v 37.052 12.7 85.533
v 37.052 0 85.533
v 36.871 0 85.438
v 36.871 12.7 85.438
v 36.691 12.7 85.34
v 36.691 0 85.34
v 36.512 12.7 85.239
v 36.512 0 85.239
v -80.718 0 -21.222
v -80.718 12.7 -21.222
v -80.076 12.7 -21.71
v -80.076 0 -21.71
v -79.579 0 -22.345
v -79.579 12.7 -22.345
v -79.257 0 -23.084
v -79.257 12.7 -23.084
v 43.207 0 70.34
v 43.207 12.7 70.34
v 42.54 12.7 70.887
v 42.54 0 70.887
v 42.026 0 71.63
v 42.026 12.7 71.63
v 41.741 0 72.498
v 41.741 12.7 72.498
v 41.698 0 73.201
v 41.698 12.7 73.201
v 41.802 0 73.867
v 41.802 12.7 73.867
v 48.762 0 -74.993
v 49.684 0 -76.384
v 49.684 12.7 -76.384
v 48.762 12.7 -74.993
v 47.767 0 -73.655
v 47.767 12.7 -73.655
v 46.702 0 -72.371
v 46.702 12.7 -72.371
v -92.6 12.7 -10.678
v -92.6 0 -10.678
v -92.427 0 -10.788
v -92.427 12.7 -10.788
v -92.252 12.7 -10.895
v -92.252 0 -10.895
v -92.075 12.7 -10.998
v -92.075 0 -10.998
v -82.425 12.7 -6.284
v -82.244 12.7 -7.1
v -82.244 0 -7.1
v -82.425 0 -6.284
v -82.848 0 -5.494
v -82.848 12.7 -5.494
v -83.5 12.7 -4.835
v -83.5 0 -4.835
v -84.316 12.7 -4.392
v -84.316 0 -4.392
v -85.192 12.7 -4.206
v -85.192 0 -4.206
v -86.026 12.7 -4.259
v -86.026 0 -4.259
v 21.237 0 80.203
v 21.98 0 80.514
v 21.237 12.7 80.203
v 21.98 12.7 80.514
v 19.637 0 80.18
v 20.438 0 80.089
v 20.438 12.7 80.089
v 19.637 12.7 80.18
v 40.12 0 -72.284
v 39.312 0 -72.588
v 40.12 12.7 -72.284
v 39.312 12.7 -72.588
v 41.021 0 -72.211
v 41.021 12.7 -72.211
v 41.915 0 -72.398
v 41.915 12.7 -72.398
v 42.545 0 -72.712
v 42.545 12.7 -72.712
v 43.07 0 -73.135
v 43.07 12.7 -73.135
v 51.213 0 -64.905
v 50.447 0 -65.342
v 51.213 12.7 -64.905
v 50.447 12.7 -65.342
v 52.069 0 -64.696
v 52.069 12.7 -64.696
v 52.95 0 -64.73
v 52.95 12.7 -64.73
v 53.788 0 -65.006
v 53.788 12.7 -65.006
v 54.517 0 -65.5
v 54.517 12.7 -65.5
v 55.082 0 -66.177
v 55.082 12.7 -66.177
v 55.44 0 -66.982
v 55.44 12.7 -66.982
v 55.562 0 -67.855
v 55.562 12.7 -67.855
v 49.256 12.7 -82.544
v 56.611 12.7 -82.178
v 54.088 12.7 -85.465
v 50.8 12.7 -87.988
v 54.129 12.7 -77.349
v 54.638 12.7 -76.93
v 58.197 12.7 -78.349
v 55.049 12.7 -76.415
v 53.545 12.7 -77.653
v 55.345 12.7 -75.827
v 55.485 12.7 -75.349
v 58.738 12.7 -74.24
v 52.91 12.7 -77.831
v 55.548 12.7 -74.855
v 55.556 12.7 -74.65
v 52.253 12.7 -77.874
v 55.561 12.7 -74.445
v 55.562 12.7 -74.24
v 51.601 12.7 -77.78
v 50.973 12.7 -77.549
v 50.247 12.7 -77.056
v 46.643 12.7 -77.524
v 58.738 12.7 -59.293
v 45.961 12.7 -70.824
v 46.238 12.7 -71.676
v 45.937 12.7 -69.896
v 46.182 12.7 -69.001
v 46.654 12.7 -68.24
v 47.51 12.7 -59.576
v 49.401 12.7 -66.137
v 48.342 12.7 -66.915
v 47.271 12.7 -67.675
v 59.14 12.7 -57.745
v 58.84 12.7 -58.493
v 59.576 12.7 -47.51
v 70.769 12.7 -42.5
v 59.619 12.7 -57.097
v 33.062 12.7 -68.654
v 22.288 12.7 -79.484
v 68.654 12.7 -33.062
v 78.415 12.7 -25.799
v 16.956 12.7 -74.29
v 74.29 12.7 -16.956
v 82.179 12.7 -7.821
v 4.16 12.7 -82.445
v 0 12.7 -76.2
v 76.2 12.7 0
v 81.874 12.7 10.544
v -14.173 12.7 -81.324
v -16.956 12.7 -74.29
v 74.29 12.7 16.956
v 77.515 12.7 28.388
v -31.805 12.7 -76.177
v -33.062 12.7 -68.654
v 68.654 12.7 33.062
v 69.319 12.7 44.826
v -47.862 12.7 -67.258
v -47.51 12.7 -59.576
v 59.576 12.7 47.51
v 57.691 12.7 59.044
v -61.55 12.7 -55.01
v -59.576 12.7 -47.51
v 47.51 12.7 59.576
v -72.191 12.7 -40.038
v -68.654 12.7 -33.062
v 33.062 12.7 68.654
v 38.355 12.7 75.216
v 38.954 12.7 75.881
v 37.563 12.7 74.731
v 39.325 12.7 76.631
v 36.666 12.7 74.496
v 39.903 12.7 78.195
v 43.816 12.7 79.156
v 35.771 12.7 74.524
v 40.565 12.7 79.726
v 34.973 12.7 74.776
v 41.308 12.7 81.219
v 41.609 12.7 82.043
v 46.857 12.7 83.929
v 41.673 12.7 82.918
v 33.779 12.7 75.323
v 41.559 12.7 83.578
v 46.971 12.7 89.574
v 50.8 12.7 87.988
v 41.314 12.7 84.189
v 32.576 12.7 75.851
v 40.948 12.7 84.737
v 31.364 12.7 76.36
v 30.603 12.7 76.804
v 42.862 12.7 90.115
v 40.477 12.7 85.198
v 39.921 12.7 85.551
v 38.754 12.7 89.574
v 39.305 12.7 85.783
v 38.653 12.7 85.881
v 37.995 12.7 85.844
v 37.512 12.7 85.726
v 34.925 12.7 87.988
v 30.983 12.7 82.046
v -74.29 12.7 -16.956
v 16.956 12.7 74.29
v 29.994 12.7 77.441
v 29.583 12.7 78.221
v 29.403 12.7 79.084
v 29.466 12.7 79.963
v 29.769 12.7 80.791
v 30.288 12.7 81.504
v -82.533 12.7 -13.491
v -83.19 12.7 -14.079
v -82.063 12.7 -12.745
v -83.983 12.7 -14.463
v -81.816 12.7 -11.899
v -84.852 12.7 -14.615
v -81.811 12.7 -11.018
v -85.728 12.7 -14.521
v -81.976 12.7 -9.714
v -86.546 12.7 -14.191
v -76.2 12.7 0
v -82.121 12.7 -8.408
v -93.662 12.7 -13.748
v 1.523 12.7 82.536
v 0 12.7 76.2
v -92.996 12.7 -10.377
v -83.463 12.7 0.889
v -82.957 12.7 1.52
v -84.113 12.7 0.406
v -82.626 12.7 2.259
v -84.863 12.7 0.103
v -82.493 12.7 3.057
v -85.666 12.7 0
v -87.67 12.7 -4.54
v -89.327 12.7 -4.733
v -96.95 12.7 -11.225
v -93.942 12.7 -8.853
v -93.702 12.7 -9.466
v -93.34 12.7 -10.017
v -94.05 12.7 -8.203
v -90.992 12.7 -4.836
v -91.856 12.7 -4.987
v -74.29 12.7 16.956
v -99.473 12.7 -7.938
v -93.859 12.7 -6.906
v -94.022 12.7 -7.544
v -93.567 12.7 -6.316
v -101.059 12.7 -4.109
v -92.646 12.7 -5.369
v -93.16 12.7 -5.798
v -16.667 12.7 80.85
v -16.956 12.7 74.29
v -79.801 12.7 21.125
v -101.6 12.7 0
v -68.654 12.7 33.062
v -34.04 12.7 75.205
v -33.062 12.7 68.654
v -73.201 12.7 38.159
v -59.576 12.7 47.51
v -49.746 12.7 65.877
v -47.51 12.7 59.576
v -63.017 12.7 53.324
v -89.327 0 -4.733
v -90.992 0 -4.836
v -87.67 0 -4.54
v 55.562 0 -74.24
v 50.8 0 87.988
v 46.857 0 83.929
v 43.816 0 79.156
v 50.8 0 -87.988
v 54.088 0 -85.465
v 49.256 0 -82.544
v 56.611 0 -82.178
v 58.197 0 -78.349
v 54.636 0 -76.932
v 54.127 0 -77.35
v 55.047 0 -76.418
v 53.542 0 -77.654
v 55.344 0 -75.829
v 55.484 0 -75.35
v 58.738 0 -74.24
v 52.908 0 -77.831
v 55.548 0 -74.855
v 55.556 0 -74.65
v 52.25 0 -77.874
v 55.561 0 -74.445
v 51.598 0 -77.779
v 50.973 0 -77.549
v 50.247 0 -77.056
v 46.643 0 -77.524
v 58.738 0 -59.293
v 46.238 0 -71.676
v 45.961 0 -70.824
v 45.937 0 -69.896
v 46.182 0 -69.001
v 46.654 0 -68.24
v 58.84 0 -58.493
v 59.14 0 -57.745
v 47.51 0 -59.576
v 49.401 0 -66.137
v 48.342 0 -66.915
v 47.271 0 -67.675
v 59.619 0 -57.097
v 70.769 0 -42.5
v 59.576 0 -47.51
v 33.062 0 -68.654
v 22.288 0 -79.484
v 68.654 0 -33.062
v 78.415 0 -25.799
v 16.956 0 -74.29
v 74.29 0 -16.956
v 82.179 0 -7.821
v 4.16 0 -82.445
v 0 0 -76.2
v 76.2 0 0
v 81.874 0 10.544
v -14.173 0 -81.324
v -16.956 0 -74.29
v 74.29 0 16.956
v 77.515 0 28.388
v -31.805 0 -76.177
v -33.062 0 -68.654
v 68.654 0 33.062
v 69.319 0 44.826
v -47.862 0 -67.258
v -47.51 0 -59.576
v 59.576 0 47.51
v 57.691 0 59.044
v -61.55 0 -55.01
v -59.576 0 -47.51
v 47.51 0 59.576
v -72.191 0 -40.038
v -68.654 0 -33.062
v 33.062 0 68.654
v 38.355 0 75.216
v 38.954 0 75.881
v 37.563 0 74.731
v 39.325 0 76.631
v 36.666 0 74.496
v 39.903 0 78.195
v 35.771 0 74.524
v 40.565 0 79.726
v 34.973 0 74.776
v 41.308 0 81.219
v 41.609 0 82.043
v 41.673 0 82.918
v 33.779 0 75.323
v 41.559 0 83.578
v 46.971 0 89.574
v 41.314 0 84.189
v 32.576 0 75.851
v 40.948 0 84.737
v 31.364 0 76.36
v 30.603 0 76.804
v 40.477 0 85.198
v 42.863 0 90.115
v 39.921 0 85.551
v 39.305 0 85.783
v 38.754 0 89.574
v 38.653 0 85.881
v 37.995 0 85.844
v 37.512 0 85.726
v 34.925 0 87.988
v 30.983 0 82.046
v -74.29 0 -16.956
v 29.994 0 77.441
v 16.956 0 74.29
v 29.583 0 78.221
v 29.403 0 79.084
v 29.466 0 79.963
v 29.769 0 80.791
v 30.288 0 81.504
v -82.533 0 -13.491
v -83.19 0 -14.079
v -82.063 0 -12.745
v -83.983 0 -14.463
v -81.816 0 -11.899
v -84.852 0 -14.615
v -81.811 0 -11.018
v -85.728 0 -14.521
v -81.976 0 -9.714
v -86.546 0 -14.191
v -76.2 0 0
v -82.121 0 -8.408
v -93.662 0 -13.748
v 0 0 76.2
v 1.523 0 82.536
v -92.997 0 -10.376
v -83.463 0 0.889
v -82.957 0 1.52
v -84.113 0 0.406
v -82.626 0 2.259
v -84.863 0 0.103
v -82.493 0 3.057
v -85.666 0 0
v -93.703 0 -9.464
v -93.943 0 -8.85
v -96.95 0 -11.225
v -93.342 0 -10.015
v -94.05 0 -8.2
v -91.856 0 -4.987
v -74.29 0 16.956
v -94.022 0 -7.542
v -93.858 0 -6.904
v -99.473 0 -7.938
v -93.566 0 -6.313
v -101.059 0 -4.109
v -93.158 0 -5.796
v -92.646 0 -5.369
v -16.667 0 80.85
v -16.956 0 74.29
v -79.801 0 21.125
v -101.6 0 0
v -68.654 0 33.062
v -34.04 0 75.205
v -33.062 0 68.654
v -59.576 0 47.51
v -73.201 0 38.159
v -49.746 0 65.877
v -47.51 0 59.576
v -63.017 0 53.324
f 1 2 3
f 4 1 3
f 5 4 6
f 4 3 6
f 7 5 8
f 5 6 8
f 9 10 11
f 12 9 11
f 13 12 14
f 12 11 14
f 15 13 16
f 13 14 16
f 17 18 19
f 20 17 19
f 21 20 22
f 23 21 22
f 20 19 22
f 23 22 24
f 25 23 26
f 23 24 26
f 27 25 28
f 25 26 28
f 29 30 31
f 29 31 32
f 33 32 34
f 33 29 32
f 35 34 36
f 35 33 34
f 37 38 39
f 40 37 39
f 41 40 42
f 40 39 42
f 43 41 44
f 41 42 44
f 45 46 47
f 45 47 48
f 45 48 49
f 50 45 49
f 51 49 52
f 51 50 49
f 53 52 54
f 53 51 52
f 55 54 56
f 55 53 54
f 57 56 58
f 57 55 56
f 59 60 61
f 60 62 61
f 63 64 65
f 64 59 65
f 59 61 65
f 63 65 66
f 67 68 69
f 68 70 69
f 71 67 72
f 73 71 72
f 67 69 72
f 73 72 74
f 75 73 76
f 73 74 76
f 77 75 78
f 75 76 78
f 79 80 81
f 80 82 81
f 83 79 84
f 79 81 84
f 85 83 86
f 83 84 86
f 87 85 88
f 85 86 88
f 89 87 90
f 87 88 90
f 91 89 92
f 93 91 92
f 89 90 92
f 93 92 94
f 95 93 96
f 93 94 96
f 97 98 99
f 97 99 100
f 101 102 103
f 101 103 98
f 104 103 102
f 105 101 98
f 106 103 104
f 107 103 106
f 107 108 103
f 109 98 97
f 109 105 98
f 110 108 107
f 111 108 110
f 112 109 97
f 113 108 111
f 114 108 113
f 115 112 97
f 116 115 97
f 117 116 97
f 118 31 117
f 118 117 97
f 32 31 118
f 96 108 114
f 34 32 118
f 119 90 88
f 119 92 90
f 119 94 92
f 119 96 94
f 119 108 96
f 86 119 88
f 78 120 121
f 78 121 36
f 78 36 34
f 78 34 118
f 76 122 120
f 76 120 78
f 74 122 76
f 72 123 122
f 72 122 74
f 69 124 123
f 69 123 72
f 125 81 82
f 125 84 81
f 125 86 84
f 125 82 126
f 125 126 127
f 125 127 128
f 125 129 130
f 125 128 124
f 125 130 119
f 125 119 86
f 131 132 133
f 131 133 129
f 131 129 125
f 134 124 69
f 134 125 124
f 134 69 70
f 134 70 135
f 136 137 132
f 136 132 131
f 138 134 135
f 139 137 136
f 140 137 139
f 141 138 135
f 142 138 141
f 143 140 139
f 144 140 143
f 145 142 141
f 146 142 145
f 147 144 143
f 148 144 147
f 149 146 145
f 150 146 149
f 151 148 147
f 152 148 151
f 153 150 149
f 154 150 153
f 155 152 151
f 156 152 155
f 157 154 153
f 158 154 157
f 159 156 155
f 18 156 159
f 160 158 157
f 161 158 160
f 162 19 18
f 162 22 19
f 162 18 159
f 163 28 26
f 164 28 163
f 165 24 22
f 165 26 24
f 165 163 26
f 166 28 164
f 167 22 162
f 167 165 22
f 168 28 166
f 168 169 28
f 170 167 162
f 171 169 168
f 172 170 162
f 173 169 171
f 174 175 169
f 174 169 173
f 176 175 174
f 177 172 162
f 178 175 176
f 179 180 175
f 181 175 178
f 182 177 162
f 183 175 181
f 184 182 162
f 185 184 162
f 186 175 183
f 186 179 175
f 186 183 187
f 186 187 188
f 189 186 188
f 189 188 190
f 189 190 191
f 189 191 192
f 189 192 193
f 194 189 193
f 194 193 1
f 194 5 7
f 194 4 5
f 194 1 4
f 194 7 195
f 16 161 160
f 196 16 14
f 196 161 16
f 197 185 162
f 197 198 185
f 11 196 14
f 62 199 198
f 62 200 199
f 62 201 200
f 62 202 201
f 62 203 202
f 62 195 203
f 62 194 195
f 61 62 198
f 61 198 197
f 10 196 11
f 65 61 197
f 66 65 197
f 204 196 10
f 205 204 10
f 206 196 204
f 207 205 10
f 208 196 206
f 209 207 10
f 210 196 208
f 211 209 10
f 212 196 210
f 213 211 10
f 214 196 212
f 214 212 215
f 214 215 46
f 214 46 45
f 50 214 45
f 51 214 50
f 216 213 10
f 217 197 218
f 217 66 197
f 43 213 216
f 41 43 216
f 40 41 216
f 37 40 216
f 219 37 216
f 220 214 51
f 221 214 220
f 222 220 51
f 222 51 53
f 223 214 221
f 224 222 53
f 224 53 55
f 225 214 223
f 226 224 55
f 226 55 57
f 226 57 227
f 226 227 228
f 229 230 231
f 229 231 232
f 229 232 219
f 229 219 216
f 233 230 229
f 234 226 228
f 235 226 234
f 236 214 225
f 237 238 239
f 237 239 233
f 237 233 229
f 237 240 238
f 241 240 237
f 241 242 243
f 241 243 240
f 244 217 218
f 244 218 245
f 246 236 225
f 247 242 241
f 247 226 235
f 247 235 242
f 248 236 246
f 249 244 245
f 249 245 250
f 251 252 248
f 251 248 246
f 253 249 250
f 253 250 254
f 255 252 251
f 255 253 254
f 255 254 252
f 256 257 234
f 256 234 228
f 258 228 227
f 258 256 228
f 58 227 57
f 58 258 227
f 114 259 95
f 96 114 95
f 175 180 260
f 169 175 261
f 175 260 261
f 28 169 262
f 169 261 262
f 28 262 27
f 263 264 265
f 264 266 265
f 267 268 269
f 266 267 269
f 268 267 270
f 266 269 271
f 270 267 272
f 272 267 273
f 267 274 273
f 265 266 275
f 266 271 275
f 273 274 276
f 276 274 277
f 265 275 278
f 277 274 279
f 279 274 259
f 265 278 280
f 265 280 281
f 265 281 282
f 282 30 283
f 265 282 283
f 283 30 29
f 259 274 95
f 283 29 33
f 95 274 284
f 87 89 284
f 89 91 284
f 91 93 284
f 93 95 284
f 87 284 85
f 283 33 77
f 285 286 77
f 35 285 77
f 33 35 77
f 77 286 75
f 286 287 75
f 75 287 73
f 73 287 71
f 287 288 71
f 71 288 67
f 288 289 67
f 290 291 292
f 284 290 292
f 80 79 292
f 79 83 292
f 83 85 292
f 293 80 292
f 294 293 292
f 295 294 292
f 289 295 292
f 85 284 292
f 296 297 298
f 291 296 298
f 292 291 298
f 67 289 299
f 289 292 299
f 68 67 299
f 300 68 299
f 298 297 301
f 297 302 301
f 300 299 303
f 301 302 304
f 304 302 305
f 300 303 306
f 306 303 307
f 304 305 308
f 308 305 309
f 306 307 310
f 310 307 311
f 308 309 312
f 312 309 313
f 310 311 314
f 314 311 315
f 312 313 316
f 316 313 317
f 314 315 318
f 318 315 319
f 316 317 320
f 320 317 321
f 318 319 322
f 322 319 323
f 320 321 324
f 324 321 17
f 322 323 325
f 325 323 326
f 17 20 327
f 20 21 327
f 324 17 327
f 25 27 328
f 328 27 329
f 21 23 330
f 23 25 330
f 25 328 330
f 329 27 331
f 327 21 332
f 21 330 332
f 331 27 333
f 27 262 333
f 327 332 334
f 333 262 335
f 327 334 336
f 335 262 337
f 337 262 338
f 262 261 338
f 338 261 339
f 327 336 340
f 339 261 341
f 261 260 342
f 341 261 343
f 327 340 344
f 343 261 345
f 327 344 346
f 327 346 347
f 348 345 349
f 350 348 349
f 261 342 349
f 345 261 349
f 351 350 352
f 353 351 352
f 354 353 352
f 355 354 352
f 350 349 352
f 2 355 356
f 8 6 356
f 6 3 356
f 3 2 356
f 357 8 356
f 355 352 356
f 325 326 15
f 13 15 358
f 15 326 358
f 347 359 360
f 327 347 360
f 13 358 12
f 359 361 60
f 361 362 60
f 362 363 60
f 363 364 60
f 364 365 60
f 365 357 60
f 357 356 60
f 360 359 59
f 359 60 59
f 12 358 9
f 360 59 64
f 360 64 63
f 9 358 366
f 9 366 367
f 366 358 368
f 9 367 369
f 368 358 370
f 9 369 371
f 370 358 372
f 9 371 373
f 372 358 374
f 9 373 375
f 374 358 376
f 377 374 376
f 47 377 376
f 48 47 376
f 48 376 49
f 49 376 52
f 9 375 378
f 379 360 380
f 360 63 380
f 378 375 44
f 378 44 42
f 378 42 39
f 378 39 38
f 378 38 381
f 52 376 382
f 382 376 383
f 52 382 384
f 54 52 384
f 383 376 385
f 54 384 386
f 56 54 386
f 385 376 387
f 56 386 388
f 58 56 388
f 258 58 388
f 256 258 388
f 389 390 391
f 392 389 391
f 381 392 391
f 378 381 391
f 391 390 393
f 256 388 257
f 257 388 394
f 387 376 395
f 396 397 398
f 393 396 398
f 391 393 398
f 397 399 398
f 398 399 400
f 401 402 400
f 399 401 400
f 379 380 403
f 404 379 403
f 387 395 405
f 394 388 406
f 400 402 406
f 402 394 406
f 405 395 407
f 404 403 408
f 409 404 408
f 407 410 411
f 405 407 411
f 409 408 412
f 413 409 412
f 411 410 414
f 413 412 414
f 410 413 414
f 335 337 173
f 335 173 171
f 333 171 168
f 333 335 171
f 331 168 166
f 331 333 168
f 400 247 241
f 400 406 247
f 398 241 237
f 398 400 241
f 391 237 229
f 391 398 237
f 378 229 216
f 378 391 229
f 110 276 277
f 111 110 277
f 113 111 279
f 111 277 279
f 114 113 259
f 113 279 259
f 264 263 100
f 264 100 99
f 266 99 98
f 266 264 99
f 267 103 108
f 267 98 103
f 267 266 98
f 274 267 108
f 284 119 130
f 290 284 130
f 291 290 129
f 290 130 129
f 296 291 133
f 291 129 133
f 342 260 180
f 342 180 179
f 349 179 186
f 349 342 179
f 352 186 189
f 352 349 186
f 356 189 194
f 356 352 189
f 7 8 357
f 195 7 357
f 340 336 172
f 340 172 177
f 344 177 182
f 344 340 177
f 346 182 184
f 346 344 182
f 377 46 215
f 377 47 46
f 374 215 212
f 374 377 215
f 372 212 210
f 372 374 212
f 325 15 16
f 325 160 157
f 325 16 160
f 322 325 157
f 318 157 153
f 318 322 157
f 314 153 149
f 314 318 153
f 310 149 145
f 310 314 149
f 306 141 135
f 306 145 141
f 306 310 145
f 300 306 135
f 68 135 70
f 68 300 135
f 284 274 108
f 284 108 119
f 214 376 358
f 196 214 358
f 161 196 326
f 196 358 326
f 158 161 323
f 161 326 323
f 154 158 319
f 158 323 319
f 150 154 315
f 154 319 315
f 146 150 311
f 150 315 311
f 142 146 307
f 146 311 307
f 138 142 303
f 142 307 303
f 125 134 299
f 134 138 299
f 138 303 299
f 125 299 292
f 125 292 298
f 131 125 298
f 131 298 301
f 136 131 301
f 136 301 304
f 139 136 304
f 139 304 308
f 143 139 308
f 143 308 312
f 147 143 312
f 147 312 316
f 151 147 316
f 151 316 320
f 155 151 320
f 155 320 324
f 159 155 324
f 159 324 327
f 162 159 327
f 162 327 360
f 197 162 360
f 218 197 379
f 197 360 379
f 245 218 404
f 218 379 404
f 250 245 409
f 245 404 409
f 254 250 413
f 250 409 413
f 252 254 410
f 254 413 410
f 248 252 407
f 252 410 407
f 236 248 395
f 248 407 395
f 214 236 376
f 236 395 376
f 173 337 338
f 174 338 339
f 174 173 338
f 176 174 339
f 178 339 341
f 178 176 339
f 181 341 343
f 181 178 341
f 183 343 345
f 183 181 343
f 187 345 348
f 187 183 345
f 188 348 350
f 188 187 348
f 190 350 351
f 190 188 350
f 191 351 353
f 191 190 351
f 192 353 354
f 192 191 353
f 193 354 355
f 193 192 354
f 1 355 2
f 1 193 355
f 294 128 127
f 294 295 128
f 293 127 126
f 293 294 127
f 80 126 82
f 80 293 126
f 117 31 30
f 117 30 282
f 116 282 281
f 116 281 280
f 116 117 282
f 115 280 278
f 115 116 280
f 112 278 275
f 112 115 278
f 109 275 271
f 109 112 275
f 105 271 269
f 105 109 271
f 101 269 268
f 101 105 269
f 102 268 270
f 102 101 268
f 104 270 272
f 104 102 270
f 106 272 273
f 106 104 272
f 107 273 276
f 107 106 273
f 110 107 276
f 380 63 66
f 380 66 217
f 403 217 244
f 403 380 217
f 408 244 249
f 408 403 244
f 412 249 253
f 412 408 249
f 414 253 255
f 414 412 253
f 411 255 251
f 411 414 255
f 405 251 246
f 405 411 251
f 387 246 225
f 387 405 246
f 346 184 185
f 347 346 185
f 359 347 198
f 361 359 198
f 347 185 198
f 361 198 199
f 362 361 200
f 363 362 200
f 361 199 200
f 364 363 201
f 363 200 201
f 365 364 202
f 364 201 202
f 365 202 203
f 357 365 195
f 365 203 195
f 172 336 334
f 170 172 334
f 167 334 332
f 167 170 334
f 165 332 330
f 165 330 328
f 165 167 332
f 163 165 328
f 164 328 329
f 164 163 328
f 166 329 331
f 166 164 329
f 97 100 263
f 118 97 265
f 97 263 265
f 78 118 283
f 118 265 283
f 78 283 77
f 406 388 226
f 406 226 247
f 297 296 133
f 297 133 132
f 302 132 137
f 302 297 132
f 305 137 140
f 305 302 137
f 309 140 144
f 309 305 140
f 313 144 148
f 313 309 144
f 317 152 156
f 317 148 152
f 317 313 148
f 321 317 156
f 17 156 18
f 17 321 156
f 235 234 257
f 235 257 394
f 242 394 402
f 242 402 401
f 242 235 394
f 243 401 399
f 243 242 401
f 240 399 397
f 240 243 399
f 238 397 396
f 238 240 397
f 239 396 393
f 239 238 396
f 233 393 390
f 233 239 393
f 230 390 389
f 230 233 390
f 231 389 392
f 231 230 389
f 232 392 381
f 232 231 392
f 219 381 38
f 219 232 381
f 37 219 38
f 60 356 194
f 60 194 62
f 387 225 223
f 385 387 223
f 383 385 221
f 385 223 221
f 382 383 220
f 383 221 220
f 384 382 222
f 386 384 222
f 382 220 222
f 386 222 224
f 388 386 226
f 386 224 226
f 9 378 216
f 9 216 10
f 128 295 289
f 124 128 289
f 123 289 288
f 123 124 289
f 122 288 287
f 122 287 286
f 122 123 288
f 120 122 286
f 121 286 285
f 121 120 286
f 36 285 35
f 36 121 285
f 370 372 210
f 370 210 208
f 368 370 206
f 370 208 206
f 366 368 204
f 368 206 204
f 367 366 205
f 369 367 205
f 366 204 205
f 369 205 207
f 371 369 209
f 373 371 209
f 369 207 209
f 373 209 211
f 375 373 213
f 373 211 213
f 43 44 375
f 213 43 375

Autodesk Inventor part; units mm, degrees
ref_plane "YZ Plane" through (0, 0, 0) normal (1, 0, 0) x (0, 1, 0)
ref_plane "XZ Plane" through (0, 0, 0) normal (0, 1, 0) x (-1, 0, 0)
ref_plane "XY Plane" through (0, 0, 0) normal (0, 0, 1) x (1, 0, 0)
sketch "Sketch1" plane through (0, 0, 0) normal (0, 1, 0) x (-1, 0, 0)
  circle A0 centre (0, 0) radius 76.2
  circle A1 centre (0, 0) radius 82.55
  line L0 (0, 0) -> (101.6, 0)
  arc A2 (82.55, 0) -> (101.6, 0) centre (92.075, 26.1697) ccw
  line L1 (101.6, 0) -> (92.4836, -3.3181) construction
  arc A3 (93.6625, -13.7482) -> (101.6, 0) centre (85.725, 0) ccw
  line L2 (93.6625, -13.7482) -> (79.6013, -21.8664)
  arc A4 (92.075, -10.9985) -> (98.3891, -0.9543) centre (85.725, 0) ccw
  line L3 (92.075, -10.9985) -> (80.6536, -17.5927)
  arc A5 (82.4826, -3.3343) -> (101.2144, -3.4778) centre (92.075, 26.1697) ccw
  arc A6 (-41.275, 71.4904) -> (-50.8, 87.9882) centre (-68.7011, 66.6544) ccw
  line L4 (-50.8, 87.9882) -> (-43.3683, 81.7522) construction
  arc A7 (-34.925, 87.9882) -> (-50.8, 87.9882) centre (-42.8625, 74.24) ccw
  line L5 (-34.925, 87.9882) -> (-20.8638, 79.8699)
  arc A8 (-36.5125, 85.2386) -> (-48.3681, 85.6846) centre (-42.8625, 74.24) ccw
  line L6 (-36.5125, 85.2386) -> (-25.0911, 78.6444)
  arc A9 (-38.3537, 73.0992) -> (-47.5953, 89.3931) centre (-68.7011, 66.6544) ccw
  arc A10 (-41.275, -71.4904) -> (-50.8, -87.9882) centre (-23.3739, -92.8242) ccw
  line L7 (-50.8, -87.9882) -> (-49.1154, -78.4341) construction
  arc A11 (-58.7375, -74.24) -> (-50.8, -87.9882) centre (-42.8625, -74.24) ccw
  line L8 (-58.7375, -74.24) -> (-58.7375, -58.0035)
  arc A12 (-55.5625, -74.24) -> (-50.021, -84.7303) centre (-42.8625, -74.24) ccw
  line L9 (-55.5625, -74.24) -> (-55.5625, -61.0517)
  arc A13 (-44.1289, -69.7649) -> (-53.619, -85.9153) centre (-23.3739, -92.8242) ccw
  point P0 (-20.8638, 79.8699)
  point P1 (-41.275, 71.4904)
  point P2 (-58.7375, -58.0035)
  point P3 (-41.275, -71.4904)
  point P4 (-44.1289, -69.7649)
  point P5 (-52.5943, -82.3998)
  point P6 (-55.5625, -61.0517)
  point P7 (-38.3537, 73.0992)
  point P8 (-45.0631, 86.7479)
  point P9 (-25.0911, 78.6444)
  point P10 (97.6575, -4.3481)
  dimension "d0" = 152.4
  dimension "d1" = 6.35
  dimension "d2" = 101.6
  dimension "d3" = 20
  dimension "d4" = 15.875
  dimension "d5" = 30
  dimension "d10" = 3.175
  dimension "d11" = 3.175
  dimension "d14" = 360
extrude "Extrusion1" add sketch "Sketch1" along normal blind 12.7 contours A1 | L0 A2 | A2 A4 A5 A1 | A1 L6 A8 A9 A7 L5 | A3 A5 A4 A2 | L3 A4 A5 A3 L2 A1 | A1 A6 A8 A9 | A9 A8 A6 A7 | A10 A12 A13 A1 | A1 L9 A12 A13 A11 L8 | A10 A11 A13 A12
fillet "Fillet1" radius 3.175 15 edges at (41.275, 6.35, 71.4904) (38.3537, 6.35, 73.0992) (25.0911, 6.35, 78.6444) (45.0631, 6.35, 86.7479) (52.5943, 6.35, -82.3998) (55.5625, 6.35, -61.0517) (44.1289, 6.35, -69.7649) (41.275, 6.35, -71.4904) (-79.6013, 6.35, -21.8664) (-80.6536, 6.35, -17.5927) (-82.4826, 6.35, -3.3343) (-97.6575, 6.35, -4.3481) (-82.55, 6.35, 0) (58.7375, 6.35, -58.0035) (20.8638, 6.35, 79.8699)
equation "\"d10\" = d11"
properties part number "Ring" material "Stainless Steel"
